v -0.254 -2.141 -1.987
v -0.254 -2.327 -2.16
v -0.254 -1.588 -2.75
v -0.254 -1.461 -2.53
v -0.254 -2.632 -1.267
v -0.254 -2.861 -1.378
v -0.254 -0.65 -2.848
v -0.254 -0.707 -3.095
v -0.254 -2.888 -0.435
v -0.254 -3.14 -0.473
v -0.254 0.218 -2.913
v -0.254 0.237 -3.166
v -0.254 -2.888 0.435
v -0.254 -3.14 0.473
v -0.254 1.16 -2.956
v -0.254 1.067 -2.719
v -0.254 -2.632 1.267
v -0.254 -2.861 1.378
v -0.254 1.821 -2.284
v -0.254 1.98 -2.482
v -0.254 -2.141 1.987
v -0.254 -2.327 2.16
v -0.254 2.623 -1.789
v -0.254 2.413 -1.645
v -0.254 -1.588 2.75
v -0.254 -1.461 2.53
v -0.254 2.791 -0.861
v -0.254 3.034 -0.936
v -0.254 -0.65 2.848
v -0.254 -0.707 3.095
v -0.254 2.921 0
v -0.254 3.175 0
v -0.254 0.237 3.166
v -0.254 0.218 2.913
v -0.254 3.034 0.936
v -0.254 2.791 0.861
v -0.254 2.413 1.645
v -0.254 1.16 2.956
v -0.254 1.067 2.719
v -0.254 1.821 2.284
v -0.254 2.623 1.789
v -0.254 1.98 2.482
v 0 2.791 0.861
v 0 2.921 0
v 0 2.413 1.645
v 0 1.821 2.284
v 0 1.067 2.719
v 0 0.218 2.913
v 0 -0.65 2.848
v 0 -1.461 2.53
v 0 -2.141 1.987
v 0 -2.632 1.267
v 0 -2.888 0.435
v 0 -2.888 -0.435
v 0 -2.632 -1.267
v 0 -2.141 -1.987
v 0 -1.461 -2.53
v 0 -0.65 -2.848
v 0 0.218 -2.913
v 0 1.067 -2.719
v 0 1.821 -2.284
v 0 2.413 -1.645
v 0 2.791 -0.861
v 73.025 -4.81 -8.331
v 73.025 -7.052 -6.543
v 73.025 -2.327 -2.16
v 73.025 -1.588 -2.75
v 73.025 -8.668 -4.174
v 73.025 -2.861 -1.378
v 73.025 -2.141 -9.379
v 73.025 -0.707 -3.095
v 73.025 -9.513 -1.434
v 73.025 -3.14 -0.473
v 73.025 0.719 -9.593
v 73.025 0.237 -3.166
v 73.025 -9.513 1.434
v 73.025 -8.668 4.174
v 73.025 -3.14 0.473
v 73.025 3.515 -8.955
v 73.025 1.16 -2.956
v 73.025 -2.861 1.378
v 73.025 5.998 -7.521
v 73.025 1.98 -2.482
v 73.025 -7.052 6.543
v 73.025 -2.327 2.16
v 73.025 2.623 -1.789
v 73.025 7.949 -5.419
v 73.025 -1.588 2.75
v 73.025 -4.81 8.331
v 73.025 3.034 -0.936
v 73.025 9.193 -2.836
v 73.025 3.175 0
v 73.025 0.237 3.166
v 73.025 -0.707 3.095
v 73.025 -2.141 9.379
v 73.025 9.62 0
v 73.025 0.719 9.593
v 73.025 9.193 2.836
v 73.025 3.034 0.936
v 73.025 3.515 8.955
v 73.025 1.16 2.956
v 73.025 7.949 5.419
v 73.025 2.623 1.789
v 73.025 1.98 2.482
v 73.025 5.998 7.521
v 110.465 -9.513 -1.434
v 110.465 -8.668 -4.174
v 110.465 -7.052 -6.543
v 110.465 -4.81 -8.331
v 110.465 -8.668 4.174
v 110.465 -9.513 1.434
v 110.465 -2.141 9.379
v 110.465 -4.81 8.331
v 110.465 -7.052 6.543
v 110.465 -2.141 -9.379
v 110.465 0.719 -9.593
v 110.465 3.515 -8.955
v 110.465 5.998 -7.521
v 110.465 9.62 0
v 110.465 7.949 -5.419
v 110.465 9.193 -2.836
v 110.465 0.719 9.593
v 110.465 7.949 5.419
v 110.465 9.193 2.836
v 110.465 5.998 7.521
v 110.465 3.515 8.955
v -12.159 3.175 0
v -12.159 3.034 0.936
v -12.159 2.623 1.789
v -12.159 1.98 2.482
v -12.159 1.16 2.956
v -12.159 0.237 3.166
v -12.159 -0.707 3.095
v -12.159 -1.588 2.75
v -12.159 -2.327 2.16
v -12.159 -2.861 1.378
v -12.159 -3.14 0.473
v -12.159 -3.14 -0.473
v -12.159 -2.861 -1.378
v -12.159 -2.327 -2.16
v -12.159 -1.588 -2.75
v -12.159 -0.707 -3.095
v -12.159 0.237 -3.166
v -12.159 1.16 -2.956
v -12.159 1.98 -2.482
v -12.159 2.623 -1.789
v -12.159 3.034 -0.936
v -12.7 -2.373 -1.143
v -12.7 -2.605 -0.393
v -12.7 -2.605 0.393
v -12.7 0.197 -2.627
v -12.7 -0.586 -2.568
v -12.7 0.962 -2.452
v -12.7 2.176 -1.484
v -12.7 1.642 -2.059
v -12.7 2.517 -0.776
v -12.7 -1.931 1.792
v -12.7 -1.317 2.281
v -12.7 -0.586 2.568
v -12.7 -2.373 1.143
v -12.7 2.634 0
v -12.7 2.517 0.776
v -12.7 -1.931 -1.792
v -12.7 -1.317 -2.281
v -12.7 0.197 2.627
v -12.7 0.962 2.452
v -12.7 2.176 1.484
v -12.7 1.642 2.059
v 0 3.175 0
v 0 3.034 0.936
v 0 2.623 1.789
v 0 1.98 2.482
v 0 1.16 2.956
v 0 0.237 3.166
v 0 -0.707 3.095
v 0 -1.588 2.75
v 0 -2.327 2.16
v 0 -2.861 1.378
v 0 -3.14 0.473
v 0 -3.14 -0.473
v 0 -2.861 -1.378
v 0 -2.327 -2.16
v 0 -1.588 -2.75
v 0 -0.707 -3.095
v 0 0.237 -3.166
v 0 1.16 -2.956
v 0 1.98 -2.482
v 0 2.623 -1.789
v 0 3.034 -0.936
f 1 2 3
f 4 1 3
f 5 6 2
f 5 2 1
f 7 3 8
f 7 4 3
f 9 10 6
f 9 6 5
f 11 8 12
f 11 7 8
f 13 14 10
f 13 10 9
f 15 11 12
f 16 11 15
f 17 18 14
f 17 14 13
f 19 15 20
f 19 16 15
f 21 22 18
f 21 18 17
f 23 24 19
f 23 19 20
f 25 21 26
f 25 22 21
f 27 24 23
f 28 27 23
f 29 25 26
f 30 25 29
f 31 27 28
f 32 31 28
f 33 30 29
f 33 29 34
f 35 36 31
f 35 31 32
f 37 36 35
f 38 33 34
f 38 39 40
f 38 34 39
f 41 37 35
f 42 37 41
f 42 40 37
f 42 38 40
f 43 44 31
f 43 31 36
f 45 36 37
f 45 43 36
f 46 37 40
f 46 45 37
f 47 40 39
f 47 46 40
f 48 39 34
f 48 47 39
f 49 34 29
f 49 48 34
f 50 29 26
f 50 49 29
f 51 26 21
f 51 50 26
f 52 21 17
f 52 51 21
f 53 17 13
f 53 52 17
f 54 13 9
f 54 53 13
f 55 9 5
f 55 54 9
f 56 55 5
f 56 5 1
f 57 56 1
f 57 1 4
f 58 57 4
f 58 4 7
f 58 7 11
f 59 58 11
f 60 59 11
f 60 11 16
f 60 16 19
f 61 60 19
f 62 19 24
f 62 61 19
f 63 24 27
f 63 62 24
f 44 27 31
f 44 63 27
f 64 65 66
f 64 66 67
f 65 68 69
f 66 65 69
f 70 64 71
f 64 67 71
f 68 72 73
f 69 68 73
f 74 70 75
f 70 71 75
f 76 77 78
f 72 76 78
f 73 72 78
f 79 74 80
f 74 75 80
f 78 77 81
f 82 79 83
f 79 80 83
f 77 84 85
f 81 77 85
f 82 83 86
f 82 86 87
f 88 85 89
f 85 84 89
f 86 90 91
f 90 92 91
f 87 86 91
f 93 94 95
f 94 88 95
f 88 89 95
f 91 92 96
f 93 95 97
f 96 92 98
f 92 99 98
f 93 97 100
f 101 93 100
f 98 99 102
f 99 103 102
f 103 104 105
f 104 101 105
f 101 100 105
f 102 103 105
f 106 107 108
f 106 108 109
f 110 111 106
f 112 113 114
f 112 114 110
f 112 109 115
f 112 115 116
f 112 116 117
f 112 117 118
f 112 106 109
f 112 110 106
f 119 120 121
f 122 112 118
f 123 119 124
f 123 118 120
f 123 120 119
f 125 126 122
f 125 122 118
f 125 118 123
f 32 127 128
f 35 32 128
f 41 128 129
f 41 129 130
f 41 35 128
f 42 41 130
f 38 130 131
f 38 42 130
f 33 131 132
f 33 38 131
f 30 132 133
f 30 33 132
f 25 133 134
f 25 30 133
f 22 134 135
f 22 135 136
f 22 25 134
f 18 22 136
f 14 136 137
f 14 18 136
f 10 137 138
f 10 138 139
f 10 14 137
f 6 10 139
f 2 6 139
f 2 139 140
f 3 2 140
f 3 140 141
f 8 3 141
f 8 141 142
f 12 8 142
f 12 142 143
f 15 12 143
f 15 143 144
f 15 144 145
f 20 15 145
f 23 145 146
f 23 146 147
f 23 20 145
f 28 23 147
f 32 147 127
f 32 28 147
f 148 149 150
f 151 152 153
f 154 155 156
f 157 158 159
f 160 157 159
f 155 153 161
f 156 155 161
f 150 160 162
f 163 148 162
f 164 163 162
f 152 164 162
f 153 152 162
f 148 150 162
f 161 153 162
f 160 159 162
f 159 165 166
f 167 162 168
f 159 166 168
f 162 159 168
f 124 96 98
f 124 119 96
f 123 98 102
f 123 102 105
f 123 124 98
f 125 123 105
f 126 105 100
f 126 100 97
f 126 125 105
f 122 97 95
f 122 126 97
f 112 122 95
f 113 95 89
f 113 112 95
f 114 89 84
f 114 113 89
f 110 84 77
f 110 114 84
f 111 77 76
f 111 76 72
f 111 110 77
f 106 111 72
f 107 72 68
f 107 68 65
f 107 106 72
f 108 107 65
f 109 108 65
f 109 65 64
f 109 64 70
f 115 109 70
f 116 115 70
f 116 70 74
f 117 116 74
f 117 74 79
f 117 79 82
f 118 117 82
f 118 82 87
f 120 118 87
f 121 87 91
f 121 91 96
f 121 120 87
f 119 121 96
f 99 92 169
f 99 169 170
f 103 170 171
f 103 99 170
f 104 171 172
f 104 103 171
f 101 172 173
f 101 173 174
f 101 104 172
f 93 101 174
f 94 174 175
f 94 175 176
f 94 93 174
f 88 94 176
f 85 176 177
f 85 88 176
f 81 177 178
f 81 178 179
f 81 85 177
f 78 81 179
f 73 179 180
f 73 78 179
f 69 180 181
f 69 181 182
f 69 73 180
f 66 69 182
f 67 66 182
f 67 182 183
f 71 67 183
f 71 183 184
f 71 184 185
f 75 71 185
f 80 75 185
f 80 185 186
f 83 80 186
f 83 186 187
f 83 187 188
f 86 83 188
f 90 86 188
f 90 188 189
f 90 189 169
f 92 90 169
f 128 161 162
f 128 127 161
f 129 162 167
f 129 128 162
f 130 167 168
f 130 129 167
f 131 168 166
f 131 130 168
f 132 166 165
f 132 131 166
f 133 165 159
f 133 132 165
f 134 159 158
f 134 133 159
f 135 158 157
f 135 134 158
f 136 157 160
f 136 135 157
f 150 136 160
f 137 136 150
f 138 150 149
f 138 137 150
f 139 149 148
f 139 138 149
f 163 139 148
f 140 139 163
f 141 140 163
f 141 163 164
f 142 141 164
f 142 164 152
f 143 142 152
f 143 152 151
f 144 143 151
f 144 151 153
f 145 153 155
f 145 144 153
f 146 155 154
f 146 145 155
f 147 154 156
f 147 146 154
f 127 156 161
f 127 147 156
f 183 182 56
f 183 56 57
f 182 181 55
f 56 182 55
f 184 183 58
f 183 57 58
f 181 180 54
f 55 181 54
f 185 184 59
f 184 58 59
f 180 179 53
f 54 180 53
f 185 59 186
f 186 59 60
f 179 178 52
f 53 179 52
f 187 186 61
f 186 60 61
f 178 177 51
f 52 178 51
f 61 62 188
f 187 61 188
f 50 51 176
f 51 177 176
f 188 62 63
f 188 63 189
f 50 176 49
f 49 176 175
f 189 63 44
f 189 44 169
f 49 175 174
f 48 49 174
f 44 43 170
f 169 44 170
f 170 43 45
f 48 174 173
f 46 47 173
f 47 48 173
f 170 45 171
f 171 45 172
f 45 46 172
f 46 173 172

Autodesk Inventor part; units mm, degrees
sketch "Sketch_1" plane through (0, 0, 0) normal (0, 0, 1) x (1, 0, 0)
  line L0 (110.4646, 0) -> (0, 0)
  line L1 (0, 0) -> (0, 3.175)
  line L2 (0, 3.175) -> (73.025, 3.175)
  line L3 (73.025, 3.175) -> (73.025, 9.6203)
  line L4 (73.025, 9.6203) -> (110.4646, 9.6203)
  line L5 (110.4646, 9.6203) -> (110.4646, 0)
  line L6 (110.4646, 0) -> (0, 0)
revolve "Revolution1" add sketch "Sketch_1" angle 360 about axis through (110.4646, 0, 0) along (1, 0, 0)
sketch "Sketch_3" plane through (0, 0, 0) normal (0, 0, 1) x (1, 0, 0)
  line L0 (0, 0) -> (-12.7, 0)
  line L1 (-12.7, 0) -> (-12.7, 2.634)
  line L2 (-12.7, 2.634) -> (-12.159, 3.175)
  line L3 (-12.159, 3.175) -> (0, 3.175)
  line L4 (0, 3.175) -> (0, 0)
  line L5 (0, 0) -> (-12.7, 0)
revolve "Revolution2" add sketch "Sketch_3" angle 360 about axis through (0, 0, 0) along (1, 0, 0)
thread "Thread1" size "1/4-28 UNF" class "2A" standard "ANSI Unified Screw Threads" length 12.159
sketch "Sketch_30" plane through (0, 0, 0) normal (0, 0, 1) x (1, 0, 0)
  line L0 (0, 0) -> (-0.254, 0)
  line L1 (-0.254, 2.921) -> (0, 2.921)
  line L2 (0, 2.921) -> (0, 3.429)
  line L3 (0, 3.429) -> (-0.254, 3.429)
  line L4 (-0.254, 3.429) -> (-0.254, 2.921)
revolve "Revolution3" cut sketch "Sketch_30" angle 360 about axis through (0, 0, 0) along (1, 0, 0)
ref_plane "dia1_XY" through (0, 3.175, 0) normal (1, 0, 0) x (0, 0, -1)
ref_plane "dia1_YZ" through (0, 3.175, 0) normal (0, 0, -1) x (0, 1, 0)
ref_plane "dia1_ZX" through (0, 3.175, 0) normal (0, 1, 0) x (1, 0, 0)
ref_plane "dia12_XY" through (0, 0, 10.2235) normal (1, 0, 0) x (0, 0, -1)
ref_plane "dia12_YZ" through (0, 0, 10.2235) normal (0, 0, -1) x (0, 1, 0)
ref_plane "dia12_ZX" through (0, 0, 10.2235) normal (0, 1, 0) x (1, 0, 0)
ref_plane "dia2_XY" through (0, -3.175, 0) normal (1, 0, 0) x (0, 0, -1)
ref_plane "dia2_YZ" through (0, -3.175, 0) normal (0, 0, -1) x (0, 1, 0)
ref_plane "dia2_ZX" through (0, -3.175, 0) normal (0, 1, 0) x (1, 0, 0)
ref_plane "dia22_XY" through (0, 0, -10.2235) normal (1, 0, 0) x (0, 0, -1)
ref_plane "dia22_YZ" through (0, 0, -10.2235) normal (0, 0, -1) x (0, 1, 0)
ref_plane "dia22_ZX" through (0, 0, -10.2235) normal (0, 1, 0) x (1, 0, 0)
ref_plane "rl1_XY" through (-12.7, 0, 0) normal (1, 0, 0) x (0, 0, -1)
ref_plane "rl1_YZ" through (-12.7, 0, 0) normal (0, 0, -1) x (0, 1, 0)
ref_plane "rl1_ZX" through (-12.7, 0, 0) normal (0, 1, 0) x (1, 0, 0)
ref_plane "rl2_XY" through (0, 0, 0) normal (1, 0, 0) x (0, 0, -1)
ref_plane "rl2_YZ" through (0, 0, 0) normal (0, 0, -1) x (0, 1, 0)
ref_plane "rl2_ZX" through (0, 0, 0) normal (0, 1, 0) x (1, 0, 0)
ref_plane "rod_cp_XY" through (0, 0, 0) normal (1, 0, 0) x (0, 0, -1)
ref_plane "rod_cp_YZ" through (0, 0, 0) normal (0, 0, -1) x (0, 1, 0)
ref_plane "rod_cp_ZX" through (0, 0, 0) normal (0, 1, 0) x (1, 0, 0)
ref_plane "thd1_XY" through (-12.7, 3.175, 0) normal (1, 0, 0) x (0, 0, -1)
ref_plane "thd1_YZ" through (-12.7, 3.175, 0) normal (0, 0, -1) x (0, 1, 0)
ref_plane "thd1_ZX" through (-12.7, 3.175, 0) normal (0, 1, 0) x (1, 0, 0)
ref_plane "thd2_XY" through (-12.7, -3.175, 0) normal (1, 0, 0) x (0, 0, -1)
ref_plane "thd2_YZ" through (-12.7, -3.175, 0) normal (0, 0, -1) x (0, 1, 0)
ref_plane "thd2_ZX" through (-12.7, -3.175, 0) normal (0, 1, 0) x (1, 0, 0)
ref_plane "to_rod_clevis_XY" through (-16.764, 0, 0) normal (1, 0, 0) x (0, 0, -1)
ref_plane "to_rod_clevis_YZ" through (-16.764, 0, 0) normal (0, 0, -1) x (0, 1, 0)
ref_plane "to_rod_clevis_ZX" through (-16.764, 0, 0) normal (0, 1, 0) x (1, 0, 0)
properties part number "C-0420000_rod"
